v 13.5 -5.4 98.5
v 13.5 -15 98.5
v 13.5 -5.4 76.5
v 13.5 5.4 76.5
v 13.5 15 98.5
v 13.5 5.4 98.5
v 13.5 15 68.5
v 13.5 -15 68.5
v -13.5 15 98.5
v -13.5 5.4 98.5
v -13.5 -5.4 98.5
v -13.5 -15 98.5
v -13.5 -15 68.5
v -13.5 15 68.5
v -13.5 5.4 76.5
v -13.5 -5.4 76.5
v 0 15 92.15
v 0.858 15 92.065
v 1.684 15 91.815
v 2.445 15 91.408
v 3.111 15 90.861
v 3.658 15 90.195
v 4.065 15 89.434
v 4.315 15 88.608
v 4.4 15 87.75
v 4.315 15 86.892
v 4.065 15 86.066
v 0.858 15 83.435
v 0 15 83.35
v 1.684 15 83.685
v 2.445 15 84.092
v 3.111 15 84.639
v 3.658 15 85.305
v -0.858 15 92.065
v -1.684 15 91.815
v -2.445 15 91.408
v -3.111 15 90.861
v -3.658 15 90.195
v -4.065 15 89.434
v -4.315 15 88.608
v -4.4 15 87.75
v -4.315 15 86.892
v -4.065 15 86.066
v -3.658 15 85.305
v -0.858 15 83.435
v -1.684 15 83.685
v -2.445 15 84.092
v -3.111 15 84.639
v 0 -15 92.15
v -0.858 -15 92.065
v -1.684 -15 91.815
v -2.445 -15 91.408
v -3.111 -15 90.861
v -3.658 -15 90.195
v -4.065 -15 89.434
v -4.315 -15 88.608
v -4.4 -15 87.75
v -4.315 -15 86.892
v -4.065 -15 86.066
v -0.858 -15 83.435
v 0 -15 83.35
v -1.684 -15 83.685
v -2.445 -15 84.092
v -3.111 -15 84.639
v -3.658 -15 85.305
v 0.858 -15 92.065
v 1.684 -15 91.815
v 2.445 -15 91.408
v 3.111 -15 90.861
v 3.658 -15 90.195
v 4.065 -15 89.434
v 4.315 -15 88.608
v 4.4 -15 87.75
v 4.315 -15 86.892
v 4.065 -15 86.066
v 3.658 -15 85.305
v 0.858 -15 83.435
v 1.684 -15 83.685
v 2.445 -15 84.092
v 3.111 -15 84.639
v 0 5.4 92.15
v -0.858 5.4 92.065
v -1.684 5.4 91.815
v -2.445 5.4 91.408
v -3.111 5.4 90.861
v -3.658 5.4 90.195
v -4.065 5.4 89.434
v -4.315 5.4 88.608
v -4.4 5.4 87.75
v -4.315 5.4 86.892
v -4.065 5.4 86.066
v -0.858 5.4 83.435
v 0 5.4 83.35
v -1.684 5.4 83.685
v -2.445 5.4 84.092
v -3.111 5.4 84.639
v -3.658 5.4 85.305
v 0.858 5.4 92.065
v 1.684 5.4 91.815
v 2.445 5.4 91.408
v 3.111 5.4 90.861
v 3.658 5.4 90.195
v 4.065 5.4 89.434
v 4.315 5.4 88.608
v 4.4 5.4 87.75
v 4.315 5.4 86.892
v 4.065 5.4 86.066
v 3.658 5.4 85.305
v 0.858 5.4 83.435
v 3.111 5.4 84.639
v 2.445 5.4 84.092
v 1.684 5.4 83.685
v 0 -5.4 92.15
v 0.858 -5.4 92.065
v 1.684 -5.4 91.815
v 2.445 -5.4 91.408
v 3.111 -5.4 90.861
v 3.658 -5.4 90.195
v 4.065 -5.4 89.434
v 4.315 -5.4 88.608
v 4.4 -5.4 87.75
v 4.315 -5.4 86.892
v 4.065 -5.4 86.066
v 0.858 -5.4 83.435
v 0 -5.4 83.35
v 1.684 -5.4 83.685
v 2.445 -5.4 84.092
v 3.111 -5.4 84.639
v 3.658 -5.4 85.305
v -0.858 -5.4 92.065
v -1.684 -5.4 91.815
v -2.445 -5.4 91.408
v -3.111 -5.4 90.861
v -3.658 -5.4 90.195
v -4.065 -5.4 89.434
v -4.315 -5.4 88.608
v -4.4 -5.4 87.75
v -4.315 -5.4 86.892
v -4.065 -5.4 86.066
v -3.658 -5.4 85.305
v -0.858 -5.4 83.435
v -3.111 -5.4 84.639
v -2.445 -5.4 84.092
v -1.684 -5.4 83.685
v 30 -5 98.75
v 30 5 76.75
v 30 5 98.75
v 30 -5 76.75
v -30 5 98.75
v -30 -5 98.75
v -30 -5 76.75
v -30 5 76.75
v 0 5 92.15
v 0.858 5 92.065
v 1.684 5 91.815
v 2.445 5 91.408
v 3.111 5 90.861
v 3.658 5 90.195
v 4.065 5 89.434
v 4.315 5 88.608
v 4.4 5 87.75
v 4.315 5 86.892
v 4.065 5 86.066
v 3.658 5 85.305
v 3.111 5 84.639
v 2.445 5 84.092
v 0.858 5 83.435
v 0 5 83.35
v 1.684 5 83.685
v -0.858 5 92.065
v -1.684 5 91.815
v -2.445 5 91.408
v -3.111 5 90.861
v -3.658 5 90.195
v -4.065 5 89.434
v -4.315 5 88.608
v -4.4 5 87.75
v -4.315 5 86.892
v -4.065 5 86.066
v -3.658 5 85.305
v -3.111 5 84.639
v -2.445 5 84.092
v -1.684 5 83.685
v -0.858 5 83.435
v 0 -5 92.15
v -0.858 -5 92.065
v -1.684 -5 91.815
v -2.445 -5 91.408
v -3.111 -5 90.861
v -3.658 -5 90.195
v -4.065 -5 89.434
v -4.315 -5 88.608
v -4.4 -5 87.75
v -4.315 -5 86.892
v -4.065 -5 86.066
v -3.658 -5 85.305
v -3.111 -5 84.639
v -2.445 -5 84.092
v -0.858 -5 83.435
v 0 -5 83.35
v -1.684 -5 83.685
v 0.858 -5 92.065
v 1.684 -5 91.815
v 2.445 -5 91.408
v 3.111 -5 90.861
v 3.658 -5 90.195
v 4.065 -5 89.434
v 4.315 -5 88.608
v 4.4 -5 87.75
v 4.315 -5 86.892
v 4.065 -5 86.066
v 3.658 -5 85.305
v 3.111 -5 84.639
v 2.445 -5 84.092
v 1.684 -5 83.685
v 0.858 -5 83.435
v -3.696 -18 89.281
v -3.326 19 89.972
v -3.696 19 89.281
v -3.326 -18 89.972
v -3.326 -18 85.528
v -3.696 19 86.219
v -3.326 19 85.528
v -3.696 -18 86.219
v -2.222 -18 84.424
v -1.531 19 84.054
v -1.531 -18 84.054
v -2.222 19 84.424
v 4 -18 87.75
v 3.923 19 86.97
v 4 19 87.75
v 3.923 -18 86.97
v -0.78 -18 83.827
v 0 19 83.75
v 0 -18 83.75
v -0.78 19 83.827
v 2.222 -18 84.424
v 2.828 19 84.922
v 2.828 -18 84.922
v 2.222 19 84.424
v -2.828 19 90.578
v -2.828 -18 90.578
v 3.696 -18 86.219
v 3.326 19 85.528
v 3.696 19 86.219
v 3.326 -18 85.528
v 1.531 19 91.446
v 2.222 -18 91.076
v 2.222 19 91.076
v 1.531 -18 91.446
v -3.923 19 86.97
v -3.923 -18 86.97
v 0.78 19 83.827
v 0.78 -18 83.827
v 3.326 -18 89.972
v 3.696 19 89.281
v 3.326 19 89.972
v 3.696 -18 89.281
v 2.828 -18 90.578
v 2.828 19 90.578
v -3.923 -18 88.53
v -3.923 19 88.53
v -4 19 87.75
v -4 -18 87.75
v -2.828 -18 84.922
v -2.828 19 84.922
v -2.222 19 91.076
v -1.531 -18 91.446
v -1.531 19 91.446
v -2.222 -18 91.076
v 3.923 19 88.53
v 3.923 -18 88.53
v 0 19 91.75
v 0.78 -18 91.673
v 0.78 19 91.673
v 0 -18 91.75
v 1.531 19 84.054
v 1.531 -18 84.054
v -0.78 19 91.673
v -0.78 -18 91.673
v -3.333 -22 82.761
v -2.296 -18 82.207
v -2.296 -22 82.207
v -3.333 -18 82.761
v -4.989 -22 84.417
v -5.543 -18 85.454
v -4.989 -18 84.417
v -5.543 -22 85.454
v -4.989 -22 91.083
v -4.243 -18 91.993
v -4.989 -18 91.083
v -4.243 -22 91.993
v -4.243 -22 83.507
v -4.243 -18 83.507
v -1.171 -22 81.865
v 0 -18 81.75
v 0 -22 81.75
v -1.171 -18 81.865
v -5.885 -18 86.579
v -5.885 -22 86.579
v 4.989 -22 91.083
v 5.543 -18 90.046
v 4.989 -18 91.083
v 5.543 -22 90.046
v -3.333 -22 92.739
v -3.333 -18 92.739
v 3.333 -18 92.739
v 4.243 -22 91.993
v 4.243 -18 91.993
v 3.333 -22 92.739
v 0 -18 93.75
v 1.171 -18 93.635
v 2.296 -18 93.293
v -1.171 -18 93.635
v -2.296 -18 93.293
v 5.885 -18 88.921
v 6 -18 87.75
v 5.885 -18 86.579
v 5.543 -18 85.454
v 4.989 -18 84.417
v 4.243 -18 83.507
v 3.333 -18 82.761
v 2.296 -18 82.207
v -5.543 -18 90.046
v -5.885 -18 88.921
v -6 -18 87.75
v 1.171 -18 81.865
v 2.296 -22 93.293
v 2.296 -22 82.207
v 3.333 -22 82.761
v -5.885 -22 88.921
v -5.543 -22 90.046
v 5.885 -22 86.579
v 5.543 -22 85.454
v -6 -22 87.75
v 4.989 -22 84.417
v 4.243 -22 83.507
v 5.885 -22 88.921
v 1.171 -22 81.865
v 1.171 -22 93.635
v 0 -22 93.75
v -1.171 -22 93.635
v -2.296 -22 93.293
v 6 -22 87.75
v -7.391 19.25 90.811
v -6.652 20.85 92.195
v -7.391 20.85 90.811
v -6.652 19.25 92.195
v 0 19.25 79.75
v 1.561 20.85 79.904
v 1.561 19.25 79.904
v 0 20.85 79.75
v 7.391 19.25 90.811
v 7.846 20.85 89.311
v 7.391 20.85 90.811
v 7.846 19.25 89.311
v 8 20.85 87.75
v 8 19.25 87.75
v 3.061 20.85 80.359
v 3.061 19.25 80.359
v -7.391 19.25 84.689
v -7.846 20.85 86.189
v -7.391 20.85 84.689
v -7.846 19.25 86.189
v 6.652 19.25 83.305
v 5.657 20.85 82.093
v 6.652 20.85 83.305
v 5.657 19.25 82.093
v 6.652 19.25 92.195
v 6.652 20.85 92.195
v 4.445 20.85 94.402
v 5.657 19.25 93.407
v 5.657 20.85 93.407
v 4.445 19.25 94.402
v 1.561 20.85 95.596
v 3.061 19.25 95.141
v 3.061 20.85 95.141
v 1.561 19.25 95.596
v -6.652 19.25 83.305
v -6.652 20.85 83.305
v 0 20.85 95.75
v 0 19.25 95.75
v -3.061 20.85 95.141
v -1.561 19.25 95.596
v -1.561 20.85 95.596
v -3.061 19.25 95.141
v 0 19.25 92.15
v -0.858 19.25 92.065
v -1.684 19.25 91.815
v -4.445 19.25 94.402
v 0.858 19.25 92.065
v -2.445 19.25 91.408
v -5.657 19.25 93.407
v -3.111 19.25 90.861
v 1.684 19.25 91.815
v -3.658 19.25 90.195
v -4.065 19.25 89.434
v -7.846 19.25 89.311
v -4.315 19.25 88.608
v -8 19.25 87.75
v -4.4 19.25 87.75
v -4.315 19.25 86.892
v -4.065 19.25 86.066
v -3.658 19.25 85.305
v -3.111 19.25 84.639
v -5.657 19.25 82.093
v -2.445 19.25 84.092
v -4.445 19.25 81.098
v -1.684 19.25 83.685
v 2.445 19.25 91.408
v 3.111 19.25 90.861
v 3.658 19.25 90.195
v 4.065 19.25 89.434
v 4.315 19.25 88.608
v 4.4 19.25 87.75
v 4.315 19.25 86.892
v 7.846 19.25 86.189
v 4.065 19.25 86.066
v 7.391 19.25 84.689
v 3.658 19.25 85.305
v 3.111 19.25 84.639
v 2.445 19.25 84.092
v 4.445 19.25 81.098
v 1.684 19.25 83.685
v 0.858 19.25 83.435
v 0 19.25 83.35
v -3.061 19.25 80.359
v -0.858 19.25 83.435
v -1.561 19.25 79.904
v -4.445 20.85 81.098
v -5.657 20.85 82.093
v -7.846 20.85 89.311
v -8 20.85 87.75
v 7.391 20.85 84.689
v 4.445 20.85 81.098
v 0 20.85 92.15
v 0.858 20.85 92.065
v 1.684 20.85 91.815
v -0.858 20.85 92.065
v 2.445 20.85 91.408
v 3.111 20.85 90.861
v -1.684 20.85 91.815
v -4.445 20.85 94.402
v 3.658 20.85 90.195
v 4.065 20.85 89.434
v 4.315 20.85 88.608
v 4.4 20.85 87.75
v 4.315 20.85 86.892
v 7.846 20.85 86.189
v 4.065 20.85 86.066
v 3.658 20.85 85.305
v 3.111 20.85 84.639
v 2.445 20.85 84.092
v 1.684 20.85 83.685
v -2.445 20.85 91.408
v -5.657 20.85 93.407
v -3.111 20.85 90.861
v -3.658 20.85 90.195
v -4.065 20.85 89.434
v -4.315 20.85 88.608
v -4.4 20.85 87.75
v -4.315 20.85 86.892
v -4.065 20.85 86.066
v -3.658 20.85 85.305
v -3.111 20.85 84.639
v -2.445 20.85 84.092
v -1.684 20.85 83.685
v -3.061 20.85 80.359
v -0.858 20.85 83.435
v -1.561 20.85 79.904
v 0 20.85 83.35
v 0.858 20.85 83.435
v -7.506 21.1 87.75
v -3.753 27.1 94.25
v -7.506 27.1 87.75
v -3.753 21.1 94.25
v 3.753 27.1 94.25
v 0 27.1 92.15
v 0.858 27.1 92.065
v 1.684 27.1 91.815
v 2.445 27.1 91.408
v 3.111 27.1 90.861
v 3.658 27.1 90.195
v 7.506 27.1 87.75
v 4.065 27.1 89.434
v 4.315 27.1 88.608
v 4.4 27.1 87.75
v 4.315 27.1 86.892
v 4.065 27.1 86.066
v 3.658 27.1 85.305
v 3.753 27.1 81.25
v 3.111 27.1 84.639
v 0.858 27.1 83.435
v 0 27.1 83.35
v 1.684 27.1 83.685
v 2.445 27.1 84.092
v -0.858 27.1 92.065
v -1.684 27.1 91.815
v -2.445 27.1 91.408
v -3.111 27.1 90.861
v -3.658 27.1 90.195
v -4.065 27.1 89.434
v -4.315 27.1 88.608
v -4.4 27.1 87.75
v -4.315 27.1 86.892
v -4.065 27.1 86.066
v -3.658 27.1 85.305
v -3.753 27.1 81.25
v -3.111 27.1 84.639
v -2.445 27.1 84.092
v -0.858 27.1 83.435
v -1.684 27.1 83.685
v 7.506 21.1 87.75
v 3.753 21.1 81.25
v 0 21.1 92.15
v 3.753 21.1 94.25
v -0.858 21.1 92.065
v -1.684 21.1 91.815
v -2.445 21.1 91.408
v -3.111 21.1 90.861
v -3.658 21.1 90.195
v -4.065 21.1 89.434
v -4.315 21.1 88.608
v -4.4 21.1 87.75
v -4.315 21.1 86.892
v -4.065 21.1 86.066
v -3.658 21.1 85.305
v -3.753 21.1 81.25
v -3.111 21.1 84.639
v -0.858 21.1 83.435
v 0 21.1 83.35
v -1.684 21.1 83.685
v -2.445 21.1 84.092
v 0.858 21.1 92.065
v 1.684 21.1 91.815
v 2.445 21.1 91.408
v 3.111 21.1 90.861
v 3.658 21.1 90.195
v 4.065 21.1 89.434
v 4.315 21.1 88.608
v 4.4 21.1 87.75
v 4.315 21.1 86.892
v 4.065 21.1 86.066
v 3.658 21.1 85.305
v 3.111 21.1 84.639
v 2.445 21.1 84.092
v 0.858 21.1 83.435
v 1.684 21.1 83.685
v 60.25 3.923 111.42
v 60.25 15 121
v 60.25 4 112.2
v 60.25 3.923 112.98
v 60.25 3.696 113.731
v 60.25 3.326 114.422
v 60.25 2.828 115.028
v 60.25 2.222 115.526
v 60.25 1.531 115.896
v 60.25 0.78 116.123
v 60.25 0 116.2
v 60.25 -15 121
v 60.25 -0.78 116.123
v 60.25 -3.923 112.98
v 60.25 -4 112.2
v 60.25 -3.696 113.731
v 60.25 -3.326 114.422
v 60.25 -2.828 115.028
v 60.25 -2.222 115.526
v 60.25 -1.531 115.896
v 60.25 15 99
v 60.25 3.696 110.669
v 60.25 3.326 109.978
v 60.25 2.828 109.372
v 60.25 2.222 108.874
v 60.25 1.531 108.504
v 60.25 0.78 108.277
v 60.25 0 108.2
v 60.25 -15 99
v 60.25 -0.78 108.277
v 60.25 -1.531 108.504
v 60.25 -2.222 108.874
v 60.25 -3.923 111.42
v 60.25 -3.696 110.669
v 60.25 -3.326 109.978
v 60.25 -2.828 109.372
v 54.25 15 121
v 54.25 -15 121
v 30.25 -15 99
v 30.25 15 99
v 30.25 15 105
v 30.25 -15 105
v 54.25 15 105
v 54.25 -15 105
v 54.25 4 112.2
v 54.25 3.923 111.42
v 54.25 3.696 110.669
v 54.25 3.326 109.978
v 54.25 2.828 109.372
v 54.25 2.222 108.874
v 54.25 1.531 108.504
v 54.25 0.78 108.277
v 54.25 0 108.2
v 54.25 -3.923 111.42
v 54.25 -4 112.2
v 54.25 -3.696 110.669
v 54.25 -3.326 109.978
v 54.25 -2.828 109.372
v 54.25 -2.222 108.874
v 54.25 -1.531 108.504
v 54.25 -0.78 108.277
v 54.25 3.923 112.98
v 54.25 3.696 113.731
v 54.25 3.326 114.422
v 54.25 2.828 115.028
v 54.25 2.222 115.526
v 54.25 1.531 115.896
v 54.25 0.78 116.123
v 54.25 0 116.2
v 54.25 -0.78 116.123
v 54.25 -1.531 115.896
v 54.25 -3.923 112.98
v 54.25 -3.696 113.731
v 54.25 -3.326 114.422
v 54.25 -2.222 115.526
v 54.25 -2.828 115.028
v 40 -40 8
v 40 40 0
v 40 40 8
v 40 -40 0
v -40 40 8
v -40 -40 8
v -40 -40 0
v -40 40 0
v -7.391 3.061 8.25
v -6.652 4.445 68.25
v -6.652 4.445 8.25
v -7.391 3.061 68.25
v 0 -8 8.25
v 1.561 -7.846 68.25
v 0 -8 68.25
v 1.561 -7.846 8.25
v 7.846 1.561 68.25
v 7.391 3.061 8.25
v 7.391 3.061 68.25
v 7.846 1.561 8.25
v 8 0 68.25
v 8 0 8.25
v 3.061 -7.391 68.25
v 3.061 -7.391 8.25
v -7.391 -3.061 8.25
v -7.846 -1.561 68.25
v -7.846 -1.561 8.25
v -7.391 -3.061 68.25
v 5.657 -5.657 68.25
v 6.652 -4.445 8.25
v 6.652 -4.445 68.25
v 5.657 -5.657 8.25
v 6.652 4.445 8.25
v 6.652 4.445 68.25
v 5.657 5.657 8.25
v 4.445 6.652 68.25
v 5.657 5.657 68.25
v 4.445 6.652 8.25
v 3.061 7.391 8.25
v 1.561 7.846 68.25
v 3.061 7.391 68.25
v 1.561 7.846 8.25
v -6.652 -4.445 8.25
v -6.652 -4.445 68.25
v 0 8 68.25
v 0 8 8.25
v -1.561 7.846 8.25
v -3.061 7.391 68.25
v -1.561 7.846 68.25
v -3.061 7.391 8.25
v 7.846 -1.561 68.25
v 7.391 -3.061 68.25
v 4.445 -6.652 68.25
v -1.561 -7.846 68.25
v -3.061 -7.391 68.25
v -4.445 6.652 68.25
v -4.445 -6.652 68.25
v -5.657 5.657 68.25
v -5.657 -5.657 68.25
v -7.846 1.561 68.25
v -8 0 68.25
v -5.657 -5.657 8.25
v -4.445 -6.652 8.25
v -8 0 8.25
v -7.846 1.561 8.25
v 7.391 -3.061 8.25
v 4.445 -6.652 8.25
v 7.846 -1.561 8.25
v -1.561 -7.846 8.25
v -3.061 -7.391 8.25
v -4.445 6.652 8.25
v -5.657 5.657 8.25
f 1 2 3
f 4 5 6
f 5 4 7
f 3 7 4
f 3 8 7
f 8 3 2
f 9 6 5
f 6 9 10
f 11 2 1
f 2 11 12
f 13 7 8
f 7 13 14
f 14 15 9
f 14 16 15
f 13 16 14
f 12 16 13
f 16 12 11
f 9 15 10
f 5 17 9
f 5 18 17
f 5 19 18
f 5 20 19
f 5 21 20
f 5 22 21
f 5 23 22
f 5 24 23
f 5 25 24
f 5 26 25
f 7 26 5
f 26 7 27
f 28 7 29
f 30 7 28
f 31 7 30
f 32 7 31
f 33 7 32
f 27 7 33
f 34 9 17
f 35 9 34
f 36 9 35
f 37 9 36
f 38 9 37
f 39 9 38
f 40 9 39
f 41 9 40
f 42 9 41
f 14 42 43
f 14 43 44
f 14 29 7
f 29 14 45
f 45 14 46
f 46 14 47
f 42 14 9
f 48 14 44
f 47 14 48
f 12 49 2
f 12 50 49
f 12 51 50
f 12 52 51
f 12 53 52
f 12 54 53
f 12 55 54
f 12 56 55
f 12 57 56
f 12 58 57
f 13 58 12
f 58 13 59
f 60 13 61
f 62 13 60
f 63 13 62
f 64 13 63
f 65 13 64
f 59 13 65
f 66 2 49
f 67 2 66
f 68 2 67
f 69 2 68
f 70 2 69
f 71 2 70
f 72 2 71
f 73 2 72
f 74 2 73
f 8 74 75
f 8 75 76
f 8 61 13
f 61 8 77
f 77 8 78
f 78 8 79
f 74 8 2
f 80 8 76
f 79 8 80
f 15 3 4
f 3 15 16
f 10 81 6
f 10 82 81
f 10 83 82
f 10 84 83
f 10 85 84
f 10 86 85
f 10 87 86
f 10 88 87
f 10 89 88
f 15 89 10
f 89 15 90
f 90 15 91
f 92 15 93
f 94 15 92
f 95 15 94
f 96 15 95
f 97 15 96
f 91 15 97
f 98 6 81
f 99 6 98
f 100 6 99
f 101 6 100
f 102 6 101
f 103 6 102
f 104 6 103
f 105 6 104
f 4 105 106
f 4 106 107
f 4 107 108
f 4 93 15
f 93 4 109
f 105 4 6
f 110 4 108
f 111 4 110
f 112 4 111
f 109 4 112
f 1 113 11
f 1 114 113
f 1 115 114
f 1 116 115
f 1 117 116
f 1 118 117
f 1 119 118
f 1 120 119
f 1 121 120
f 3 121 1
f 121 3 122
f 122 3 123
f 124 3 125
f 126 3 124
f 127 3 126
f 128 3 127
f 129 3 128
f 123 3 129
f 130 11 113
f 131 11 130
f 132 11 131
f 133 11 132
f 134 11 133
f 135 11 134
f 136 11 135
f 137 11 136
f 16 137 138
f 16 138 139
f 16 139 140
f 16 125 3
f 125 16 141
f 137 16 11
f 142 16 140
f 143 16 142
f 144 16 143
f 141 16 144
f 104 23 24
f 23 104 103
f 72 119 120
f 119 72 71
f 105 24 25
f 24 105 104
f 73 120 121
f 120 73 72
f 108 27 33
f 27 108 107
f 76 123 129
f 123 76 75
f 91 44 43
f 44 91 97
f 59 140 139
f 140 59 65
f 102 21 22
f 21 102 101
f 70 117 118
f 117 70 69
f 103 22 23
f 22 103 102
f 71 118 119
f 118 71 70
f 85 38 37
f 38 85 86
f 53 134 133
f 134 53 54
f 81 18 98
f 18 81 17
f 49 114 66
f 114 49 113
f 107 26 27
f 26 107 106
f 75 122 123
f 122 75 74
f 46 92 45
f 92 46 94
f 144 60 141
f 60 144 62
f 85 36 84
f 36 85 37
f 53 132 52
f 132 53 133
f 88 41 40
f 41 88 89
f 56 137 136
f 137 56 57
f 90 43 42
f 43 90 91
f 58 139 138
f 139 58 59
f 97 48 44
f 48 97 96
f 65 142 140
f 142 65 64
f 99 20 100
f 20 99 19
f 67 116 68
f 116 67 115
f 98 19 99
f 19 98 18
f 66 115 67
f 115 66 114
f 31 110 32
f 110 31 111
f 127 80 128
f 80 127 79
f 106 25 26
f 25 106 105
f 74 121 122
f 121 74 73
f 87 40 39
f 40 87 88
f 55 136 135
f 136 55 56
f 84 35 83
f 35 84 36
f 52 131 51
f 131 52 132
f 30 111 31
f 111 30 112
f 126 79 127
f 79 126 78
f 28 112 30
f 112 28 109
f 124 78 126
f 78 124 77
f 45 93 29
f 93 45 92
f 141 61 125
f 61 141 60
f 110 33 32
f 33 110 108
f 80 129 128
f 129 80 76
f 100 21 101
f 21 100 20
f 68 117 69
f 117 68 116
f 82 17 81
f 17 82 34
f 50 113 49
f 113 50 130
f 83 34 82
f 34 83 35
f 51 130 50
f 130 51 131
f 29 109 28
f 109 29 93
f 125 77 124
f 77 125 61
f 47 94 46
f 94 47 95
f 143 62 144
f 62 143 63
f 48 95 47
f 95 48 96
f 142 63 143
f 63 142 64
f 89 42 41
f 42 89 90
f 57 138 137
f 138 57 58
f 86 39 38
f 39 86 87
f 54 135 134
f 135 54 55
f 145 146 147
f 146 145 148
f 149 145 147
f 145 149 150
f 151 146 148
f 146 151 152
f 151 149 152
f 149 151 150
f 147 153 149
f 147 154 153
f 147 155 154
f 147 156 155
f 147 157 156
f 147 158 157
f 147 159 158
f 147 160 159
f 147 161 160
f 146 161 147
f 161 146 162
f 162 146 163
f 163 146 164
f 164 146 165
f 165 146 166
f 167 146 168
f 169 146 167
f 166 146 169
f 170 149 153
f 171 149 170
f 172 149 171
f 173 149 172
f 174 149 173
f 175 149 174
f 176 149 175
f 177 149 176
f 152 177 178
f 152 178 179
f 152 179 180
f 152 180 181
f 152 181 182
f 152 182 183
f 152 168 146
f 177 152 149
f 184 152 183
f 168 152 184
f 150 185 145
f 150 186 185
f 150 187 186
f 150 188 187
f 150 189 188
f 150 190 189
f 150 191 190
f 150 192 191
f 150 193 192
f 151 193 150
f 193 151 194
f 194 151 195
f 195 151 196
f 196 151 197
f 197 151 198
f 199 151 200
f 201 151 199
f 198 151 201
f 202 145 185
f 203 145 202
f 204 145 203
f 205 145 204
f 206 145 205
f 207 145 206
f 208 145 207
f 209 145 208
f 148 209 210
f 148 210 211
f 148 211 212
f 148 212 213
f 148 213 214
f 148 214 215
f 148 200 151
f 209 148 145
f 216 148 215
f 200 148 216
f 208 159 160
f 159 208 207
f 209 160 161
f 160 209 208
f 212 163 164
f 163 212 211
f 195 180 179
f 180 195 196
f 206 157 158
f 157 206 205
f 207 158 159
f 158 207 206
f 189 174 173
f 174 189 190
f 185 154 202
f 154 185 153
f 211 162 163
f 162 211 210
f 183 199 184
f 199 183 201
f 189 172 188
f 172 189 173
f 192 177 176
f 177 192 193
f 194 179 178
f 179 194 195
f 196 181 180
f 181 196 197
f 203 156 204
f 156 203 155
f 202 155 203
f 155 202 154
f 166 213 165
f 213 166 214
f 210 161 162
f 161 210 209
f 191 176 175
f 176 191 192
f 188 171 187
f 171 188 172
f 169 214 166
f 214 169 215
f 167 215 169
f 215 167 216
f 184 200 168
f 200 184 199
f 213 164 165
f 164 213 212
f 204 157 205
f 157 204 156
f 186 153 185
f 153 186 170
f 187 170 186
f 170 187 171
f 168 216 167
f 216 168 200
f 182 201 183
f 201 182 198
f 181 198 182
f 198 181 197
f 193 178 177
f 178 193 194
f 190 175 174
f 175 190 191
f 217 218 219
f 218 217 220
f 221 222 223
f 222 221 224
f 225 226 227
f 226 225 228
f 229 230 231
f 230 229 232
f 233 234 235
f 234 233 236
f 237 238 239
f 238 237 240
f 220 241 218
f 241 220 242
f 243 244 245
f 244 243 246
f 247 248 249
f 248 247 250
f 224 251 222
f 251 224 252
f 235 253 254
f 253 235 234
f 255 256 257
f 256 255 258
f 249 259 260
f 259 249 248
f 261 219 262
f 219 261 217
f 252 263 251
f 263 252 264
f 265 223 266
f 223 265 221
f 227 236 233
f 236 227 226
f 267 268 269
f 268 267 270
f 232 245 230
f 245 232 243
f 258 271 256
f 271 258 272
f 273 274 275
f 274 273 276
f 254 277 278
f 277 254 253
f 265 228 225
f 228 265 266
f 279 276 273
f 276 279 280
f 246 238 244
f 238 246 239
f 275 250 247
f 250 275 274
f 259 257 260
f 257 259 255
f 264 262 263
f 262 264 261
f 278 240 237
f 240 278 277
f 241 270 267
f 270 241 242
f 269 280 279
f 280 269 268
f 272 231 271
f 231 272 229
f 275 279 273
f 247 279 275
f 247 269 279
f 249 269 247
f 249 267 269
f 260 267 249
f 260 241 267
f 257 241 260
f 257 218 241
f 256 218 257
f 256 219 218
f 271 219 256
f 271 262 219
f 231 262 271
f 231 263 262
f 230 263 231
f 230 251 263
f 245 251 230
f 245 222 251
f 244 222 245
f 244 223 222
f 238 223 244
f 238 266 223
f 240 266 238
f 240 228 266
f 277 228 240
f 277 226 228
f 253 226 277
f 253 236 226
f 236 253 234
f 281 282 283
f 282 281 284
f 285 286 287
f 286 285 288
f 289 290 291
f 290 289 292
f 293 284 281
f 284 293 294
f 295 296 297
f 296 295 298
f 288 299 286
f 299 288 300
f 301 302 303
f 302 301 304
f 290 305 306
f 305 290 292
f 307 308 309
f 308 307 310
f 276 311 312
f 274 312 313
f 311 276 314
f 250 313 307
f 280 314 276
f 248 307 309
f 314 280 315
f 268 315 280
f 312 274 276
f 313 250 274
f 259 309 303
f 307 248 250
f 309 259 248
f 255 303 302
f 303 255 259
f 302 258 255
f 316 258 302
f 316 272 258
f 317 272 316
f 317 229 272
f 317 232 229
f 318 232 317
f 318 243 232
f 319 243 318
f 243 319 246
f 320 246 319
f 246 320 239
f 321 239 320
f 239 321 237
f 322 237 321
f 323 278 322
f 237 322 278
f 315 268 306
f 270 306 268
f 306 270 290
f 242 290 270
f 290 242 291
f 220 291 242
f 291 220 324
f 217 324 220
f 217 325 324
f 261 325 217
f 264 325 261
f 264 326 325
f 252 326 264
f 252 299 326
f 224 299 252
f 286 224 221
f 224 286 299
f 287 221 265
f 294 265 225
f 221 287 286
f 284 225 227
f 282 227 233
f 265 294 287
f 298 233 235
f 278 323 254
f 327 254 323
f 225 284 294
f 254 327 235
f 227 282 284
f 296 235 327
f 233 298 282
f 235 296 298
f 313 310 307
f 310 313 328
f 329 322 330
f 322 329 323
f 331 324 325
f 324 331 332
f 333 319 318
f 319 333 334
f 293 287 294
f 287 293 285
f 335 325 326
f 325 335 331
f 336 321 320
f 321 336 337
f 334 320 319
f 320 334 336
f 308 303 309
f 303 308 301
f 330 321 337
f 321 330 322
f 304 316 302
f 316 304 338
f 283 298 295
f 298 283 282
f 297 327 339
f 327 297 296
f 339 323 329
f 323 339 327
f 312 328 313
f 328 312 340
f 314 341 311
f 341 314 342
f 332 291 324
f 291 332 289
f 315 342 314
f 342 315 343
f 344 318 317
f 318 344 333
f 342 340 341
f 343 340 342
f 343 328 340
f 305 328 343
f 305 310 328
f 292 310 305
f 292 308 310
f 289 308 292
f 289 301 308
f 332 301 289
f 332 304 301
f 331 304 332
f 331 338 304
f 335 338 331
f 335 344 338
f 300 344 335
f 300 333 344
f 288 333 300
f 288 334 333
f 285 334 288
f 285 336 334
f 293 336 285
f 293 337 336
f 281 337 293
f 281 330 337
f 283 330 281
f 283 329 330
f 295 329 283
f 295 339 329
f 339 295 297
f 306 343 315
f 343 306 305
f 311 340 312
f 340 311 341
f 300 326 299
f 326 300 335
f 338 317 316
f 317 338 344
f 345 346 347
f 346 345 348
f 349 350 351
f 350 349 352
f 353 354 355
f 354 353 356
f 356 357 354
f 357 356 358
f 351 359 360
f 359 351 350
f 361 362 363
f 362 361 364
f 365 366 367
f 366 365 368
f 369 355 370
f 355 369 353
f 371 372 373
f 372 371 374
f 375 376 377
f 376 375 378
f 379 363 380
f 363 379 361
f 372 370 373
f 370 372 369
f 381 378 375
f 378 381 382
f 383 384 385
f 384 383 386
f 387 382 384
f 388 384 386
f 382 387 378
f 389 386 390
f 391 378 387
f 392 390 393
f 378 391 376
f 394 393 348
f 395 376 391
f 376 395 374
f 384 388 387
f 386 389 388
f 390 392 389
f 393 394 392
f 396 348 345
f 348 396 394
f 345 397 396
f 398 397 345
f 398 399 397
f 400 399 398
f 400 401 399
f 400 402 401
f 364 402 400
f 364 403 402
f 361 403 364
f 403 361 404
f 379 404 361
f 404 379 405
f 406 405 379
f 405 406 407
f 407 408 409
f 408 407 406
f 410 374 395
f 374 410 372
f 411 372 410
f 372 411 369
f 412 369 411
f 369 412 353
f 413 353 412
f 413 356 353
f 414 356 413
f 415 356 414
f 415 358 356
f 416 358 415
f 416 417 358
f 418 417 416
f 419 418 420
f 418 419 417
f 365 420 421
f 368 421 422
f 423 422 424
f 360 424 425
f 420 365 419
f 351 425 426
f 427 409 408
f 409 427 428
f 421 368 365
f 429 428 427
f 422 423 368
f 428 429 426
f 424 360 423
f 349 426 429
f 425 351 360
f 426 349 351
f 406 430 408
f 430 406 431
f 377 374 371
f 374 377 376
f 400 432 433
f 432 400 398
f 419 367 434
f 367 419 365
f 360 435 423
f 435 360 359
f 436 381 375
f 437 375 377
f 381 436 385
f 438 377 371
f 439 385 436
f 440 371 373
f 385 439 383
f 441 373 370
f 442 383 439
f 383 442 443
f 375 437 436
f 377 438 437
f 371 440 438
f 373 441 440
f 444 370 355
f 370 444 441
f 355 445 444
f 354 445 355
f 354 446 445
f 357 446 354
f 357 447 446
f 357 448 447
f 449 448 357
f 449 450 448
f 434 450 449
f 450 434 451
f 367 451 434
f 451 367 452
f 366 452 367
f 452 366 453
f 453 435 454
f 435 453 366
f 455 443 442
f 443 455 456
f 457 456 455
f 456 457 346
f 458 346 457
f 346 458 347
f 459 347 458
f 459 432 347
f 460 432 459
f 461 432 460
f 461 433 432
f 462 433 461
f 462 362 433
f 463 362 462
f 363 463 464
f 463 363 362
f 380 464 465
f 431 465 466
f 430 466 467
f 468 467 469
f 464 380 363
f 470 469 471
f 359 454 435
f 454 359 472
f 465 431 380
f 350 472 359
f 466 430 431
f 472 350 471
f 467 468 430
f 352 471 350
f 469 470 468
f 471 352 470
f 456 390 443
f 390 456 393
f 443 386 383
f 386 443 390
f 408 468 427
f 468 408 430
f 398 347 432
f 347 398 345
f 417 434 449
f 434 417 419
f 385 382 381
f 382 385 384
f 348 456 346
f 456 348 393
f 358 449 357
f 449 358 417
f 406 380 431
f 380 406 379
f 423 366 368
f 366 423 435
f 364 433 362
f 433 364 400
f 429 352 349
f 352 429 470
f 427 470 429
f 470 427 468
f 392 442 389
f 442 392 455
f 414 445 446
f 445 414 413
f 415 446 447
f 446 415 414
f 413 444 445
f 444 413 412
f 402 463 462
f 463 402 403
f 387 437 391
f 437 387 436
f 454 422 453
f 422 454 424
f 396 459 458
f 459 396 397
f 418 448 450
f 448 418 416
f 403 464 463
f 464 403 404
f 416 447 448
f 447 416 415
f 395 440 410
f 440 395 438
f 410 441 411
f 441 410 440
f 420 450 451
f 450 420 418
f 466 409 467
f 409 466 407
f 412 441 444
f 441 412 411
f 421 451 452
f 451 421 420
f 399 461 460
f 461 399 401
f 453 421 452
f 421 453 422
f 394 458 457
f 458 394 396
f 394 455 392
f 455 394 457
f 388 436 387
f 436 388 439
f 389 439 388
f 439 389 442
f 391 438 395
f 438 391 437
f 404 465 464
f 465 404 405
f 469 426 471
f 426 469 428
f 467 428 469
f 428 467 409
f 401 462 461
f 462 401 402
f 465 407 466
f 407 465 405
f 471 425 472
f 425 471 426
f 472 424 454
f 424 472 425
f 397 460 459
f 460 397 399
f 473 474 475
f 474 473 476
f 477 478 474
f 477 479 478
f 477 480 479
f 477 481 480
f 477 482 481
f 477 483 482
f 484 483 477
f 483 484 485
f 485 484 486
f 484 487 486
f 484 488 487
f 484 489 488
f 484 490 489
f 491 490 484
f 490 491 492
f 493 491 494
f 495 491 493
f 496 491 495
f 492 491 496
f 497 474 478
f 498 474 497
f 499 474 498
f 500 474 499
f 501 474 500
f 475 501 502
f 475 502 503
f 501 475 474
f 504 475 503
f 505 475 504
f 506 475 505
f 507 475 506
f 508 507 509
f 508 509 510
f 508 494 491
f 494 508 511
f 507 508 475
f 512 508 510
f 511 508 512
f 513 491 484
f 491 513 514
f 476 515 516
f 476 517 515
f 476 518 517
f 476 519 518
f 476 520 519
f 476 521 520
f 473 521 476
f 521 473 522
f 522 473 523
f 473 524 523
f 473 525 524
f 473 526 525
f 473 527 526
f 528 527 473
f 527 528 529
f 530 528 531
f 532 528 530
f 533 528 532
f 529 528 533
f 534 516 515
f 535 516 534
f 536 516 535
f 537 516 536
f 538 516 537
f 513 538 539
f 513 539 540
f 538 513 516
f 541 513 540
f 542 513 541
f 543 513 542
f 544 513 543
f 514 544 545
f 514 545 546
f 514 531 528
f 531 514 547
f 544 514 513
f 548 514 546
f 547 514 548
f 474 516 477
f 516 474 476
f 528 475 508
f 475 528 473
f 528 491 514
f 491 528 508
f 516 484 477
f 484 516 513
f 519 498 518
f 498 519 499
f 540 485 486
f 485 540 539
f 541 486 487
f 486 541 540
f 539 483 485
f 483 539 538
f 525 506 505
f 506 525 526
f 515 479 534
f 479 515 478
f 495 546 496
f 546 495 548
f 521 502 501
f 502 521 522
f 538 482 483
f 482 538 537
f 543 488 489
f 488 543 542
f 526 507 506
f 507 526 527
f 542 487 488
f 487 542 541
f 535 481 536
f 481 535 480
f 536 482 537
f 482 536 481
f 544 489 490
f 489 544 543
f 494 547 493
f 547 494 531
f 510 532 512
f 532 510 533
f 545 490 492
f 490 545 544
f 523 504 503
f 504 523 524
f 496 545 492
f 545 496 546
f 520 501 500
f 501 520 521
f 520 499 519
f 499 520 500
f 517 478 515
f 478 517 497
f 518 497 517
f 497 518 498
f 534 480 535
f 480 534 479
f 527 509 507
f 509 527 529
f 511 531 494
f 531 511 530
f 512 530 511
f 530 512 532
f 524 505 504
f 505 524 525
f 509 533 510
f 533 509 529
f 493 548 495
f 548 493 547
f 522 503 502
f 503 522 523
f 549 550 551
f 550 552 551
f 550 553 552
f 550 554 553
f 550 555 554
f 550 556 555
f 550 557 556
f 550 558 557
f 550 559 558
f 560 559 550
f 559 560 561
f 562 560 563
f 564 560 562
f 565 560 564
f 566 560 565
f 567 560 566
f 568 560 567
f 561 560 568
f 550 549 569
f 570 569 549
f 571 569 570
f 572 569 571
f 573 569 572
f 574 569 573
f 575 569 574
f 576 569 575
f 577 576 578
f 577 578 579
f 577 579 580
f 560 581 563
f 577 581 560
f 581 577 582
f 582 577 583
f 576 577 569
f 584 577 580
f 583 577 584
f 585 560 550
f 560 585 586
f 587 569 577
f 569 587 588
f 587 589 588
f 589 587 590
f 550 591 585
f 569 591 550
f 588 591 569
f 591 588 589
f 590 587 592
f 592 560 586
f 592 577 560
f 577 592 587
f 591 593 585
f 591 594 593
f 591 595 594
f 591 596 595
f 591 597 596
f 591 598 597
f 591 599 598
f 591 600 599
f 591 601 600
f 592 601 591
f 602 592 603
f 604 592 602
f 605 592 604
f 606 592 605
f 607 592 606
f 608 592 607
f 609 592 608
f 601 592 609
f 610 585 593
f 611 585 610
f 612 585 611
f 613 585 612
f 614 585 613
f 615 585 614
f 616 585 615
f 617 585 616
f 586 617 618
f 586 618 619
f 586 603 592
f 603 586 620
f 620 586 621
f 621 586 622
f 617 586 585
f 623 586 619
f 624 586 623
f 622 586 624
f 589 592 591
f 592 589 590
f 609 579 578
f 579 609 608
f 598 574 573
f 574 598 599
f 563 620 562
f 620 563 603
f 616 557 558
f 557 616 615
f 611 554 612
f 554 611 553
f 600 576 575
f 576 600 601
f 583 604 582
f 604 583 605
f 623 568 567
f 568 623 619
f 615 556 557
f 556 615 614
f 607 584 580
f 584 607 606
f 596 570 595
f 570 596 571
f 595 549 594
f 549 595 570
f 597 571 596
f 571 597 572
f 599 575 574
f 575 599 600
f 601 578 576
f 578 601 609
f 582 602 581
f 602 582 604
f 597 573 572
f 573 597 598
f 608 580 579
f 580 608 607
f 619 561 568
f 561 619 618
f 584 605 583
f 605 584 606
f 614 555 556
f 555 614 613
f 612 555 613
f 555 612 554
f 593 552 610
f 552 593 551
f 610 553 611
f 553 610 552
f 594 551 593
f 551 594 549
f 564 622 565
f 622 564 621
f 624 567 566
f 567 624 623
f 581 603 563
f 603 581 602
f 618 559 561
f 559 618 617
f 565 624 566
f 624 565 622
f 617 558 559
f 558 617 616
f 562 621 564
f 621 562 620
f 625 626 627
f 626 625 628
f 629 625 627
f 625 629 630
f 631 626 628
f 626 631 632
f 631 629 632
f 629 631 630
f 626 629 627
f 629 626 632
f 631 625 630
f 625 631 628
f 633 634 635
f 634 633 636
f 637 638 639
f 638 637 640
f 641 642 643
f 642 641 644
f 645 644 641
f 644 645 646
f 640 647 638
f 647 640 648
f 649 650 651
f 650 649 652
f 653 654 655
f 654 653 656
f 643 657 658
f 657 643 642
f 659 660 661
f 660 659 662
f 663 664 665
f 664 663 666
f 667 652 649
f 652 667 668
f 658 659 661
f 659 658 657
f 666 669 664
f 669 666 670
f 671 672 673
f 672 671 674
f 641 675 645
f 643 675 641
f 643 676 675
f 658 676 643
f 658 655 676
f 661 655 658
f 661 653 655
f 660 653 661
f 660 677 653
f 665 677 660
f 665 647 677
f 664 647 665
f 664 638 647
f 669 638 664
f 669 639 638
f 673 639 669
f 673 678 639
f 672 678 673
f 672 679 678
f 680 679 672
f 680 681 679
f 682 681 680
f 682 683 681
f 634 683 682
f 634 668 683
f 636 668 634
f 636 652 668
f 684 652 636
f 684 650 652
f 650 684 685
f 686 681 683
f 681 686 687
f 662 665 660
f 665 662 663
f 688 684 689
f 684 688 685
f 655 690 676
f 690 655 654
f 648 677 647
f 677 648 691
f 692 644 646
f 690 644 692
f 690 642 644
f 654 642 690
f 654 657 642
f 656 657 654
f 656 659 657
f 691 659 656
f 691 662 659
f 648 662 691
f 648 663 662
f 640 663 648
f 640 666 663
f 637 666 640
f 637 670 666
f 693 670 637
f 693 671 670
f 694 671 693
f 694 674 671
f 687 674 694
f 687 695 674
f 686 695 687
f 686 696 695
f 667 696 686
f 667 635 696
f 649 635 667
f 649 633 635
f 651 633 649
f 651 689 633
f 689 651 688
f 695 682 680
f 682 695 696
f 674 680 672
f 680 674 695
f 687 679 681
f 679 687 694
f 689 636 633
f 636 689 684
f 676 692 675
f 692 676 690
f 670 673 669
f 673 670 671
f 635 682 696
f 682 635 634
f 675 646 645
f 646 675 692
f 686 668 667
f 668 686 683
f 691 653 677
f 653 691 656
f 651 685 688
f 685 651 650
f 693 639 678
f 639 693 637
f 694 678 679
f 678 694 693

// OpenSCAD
$fn = 32;

// ------------------------------------------------------------------------
// Lamp arm: column d16 x 60 mm, arm 60 mm
// Every part is its own module, assembly() places every instance.
// ------------------------------------------------------------------------

// --- part 1 ---
module lamp_base() {
  difference() {
    translate([-40, -40, 0]) cube([80, 80, 8]);
  }
}

// --- part 2 ---
module lamp_column() {
  cylinder(h = 60, d = 16);
}

// --- part 3 ---
module head_fork() {
  difference() {
    translate([-13.5, -15, 0]) cube([27, 30, 30]);
    translate([-14.5, -5.4, 8]) cube([29, 10.8, 23]);
    translate([0, 0, 19.25]) rotate([90, 0, 0]) cylinder(h = 32, d = 8.8, center = true);
  }
}

// --- part 4 ---
module lamp_arm() {
  difference() {
    translate([-30, -5, 0]) cube([60, 10, 22]);
    translate([0, 0, 11]) rotate([90, 0, 0]) cylinder(h = 12, d = 8.8, center = true);
  }
}

// --- part 5 ---
module arm_pin() {
  rotate([0, 90, 0]) cylinder(h = 38, d = 8, center = true);
  translate([-22, 0, 0]) rotate([0, 90, 0]) cylinder(h = 4, d = 12);
}

// --- part 6 ---
module arm_washer() {
  difference() {
      translate([0, 0, 0]) cylinder(h = 1.6, d = 16);
      translate([0, 0, -1]) cylinder(h = 3.6, d = 8.8);
    }
}

// --- part 7 ---
module arm_nut() {
  difference() {
    linear_extrude(height = 6) polygon(points = [[7.506, 0], [3.753, 6.5], [-3.753, 6.5], [-7.506, 0], [-3.753, -6.5], [3.753, -6.5]]);
    translate([0, 0, -1]) cylinder(h = 8, d = 8.8);
  }
}

// --- part 8 ---
module shade_bracket() {
  difference() {
    translate([-15, -15, 0]) cube([30, 30, 22]);
    translate([-16, -16, 6]) cube([25, 32, 17]);
    translate([12, 0, 13.2]) rotate([0, 90, 0]) cylinder(h = 8, d = 8, center = true);
  }
}

// --- assembly ---
module assembly() {
  color([0.80, 0.24, 0.20]) translate([0, 0, 0]) rotate([0, 0, 0]) lamp_base();
  color([0.20, 0.45, 0.75]) translate([0, 0, 8.25]) rotate([0, 0, 0]) lamp_column();
  color([0.25, 0.62, 0.32]) translate([0, 0, 68.5]) rotate([0, 0, 0]) head_fork();
  color([0.92, 0.70, 0.18]) translate([0, 0, 76.75]) rotate([0, 0, 0]) lamp_arm();
  color([0.58, 0.35, 0.70]) translate([0, 0, 87.75]) rotate([0, 0, 90]) arm_pin();
  color([0.16, 0.66, 0.66]) translate([0, 20.85, 87.75]) rotate([90, 0, 0]) arm_washer();
  color([0.85, 0.48, 0.18]) translate([0, 27.1, 87.75]) rotate([90, 0, 0]) arm_nut();
  color([0.55, 0.60, 0.65]) translate([45.25, 0, 99]) rotate([0, 0, 0]) shade_bracket();
}

assembly();
